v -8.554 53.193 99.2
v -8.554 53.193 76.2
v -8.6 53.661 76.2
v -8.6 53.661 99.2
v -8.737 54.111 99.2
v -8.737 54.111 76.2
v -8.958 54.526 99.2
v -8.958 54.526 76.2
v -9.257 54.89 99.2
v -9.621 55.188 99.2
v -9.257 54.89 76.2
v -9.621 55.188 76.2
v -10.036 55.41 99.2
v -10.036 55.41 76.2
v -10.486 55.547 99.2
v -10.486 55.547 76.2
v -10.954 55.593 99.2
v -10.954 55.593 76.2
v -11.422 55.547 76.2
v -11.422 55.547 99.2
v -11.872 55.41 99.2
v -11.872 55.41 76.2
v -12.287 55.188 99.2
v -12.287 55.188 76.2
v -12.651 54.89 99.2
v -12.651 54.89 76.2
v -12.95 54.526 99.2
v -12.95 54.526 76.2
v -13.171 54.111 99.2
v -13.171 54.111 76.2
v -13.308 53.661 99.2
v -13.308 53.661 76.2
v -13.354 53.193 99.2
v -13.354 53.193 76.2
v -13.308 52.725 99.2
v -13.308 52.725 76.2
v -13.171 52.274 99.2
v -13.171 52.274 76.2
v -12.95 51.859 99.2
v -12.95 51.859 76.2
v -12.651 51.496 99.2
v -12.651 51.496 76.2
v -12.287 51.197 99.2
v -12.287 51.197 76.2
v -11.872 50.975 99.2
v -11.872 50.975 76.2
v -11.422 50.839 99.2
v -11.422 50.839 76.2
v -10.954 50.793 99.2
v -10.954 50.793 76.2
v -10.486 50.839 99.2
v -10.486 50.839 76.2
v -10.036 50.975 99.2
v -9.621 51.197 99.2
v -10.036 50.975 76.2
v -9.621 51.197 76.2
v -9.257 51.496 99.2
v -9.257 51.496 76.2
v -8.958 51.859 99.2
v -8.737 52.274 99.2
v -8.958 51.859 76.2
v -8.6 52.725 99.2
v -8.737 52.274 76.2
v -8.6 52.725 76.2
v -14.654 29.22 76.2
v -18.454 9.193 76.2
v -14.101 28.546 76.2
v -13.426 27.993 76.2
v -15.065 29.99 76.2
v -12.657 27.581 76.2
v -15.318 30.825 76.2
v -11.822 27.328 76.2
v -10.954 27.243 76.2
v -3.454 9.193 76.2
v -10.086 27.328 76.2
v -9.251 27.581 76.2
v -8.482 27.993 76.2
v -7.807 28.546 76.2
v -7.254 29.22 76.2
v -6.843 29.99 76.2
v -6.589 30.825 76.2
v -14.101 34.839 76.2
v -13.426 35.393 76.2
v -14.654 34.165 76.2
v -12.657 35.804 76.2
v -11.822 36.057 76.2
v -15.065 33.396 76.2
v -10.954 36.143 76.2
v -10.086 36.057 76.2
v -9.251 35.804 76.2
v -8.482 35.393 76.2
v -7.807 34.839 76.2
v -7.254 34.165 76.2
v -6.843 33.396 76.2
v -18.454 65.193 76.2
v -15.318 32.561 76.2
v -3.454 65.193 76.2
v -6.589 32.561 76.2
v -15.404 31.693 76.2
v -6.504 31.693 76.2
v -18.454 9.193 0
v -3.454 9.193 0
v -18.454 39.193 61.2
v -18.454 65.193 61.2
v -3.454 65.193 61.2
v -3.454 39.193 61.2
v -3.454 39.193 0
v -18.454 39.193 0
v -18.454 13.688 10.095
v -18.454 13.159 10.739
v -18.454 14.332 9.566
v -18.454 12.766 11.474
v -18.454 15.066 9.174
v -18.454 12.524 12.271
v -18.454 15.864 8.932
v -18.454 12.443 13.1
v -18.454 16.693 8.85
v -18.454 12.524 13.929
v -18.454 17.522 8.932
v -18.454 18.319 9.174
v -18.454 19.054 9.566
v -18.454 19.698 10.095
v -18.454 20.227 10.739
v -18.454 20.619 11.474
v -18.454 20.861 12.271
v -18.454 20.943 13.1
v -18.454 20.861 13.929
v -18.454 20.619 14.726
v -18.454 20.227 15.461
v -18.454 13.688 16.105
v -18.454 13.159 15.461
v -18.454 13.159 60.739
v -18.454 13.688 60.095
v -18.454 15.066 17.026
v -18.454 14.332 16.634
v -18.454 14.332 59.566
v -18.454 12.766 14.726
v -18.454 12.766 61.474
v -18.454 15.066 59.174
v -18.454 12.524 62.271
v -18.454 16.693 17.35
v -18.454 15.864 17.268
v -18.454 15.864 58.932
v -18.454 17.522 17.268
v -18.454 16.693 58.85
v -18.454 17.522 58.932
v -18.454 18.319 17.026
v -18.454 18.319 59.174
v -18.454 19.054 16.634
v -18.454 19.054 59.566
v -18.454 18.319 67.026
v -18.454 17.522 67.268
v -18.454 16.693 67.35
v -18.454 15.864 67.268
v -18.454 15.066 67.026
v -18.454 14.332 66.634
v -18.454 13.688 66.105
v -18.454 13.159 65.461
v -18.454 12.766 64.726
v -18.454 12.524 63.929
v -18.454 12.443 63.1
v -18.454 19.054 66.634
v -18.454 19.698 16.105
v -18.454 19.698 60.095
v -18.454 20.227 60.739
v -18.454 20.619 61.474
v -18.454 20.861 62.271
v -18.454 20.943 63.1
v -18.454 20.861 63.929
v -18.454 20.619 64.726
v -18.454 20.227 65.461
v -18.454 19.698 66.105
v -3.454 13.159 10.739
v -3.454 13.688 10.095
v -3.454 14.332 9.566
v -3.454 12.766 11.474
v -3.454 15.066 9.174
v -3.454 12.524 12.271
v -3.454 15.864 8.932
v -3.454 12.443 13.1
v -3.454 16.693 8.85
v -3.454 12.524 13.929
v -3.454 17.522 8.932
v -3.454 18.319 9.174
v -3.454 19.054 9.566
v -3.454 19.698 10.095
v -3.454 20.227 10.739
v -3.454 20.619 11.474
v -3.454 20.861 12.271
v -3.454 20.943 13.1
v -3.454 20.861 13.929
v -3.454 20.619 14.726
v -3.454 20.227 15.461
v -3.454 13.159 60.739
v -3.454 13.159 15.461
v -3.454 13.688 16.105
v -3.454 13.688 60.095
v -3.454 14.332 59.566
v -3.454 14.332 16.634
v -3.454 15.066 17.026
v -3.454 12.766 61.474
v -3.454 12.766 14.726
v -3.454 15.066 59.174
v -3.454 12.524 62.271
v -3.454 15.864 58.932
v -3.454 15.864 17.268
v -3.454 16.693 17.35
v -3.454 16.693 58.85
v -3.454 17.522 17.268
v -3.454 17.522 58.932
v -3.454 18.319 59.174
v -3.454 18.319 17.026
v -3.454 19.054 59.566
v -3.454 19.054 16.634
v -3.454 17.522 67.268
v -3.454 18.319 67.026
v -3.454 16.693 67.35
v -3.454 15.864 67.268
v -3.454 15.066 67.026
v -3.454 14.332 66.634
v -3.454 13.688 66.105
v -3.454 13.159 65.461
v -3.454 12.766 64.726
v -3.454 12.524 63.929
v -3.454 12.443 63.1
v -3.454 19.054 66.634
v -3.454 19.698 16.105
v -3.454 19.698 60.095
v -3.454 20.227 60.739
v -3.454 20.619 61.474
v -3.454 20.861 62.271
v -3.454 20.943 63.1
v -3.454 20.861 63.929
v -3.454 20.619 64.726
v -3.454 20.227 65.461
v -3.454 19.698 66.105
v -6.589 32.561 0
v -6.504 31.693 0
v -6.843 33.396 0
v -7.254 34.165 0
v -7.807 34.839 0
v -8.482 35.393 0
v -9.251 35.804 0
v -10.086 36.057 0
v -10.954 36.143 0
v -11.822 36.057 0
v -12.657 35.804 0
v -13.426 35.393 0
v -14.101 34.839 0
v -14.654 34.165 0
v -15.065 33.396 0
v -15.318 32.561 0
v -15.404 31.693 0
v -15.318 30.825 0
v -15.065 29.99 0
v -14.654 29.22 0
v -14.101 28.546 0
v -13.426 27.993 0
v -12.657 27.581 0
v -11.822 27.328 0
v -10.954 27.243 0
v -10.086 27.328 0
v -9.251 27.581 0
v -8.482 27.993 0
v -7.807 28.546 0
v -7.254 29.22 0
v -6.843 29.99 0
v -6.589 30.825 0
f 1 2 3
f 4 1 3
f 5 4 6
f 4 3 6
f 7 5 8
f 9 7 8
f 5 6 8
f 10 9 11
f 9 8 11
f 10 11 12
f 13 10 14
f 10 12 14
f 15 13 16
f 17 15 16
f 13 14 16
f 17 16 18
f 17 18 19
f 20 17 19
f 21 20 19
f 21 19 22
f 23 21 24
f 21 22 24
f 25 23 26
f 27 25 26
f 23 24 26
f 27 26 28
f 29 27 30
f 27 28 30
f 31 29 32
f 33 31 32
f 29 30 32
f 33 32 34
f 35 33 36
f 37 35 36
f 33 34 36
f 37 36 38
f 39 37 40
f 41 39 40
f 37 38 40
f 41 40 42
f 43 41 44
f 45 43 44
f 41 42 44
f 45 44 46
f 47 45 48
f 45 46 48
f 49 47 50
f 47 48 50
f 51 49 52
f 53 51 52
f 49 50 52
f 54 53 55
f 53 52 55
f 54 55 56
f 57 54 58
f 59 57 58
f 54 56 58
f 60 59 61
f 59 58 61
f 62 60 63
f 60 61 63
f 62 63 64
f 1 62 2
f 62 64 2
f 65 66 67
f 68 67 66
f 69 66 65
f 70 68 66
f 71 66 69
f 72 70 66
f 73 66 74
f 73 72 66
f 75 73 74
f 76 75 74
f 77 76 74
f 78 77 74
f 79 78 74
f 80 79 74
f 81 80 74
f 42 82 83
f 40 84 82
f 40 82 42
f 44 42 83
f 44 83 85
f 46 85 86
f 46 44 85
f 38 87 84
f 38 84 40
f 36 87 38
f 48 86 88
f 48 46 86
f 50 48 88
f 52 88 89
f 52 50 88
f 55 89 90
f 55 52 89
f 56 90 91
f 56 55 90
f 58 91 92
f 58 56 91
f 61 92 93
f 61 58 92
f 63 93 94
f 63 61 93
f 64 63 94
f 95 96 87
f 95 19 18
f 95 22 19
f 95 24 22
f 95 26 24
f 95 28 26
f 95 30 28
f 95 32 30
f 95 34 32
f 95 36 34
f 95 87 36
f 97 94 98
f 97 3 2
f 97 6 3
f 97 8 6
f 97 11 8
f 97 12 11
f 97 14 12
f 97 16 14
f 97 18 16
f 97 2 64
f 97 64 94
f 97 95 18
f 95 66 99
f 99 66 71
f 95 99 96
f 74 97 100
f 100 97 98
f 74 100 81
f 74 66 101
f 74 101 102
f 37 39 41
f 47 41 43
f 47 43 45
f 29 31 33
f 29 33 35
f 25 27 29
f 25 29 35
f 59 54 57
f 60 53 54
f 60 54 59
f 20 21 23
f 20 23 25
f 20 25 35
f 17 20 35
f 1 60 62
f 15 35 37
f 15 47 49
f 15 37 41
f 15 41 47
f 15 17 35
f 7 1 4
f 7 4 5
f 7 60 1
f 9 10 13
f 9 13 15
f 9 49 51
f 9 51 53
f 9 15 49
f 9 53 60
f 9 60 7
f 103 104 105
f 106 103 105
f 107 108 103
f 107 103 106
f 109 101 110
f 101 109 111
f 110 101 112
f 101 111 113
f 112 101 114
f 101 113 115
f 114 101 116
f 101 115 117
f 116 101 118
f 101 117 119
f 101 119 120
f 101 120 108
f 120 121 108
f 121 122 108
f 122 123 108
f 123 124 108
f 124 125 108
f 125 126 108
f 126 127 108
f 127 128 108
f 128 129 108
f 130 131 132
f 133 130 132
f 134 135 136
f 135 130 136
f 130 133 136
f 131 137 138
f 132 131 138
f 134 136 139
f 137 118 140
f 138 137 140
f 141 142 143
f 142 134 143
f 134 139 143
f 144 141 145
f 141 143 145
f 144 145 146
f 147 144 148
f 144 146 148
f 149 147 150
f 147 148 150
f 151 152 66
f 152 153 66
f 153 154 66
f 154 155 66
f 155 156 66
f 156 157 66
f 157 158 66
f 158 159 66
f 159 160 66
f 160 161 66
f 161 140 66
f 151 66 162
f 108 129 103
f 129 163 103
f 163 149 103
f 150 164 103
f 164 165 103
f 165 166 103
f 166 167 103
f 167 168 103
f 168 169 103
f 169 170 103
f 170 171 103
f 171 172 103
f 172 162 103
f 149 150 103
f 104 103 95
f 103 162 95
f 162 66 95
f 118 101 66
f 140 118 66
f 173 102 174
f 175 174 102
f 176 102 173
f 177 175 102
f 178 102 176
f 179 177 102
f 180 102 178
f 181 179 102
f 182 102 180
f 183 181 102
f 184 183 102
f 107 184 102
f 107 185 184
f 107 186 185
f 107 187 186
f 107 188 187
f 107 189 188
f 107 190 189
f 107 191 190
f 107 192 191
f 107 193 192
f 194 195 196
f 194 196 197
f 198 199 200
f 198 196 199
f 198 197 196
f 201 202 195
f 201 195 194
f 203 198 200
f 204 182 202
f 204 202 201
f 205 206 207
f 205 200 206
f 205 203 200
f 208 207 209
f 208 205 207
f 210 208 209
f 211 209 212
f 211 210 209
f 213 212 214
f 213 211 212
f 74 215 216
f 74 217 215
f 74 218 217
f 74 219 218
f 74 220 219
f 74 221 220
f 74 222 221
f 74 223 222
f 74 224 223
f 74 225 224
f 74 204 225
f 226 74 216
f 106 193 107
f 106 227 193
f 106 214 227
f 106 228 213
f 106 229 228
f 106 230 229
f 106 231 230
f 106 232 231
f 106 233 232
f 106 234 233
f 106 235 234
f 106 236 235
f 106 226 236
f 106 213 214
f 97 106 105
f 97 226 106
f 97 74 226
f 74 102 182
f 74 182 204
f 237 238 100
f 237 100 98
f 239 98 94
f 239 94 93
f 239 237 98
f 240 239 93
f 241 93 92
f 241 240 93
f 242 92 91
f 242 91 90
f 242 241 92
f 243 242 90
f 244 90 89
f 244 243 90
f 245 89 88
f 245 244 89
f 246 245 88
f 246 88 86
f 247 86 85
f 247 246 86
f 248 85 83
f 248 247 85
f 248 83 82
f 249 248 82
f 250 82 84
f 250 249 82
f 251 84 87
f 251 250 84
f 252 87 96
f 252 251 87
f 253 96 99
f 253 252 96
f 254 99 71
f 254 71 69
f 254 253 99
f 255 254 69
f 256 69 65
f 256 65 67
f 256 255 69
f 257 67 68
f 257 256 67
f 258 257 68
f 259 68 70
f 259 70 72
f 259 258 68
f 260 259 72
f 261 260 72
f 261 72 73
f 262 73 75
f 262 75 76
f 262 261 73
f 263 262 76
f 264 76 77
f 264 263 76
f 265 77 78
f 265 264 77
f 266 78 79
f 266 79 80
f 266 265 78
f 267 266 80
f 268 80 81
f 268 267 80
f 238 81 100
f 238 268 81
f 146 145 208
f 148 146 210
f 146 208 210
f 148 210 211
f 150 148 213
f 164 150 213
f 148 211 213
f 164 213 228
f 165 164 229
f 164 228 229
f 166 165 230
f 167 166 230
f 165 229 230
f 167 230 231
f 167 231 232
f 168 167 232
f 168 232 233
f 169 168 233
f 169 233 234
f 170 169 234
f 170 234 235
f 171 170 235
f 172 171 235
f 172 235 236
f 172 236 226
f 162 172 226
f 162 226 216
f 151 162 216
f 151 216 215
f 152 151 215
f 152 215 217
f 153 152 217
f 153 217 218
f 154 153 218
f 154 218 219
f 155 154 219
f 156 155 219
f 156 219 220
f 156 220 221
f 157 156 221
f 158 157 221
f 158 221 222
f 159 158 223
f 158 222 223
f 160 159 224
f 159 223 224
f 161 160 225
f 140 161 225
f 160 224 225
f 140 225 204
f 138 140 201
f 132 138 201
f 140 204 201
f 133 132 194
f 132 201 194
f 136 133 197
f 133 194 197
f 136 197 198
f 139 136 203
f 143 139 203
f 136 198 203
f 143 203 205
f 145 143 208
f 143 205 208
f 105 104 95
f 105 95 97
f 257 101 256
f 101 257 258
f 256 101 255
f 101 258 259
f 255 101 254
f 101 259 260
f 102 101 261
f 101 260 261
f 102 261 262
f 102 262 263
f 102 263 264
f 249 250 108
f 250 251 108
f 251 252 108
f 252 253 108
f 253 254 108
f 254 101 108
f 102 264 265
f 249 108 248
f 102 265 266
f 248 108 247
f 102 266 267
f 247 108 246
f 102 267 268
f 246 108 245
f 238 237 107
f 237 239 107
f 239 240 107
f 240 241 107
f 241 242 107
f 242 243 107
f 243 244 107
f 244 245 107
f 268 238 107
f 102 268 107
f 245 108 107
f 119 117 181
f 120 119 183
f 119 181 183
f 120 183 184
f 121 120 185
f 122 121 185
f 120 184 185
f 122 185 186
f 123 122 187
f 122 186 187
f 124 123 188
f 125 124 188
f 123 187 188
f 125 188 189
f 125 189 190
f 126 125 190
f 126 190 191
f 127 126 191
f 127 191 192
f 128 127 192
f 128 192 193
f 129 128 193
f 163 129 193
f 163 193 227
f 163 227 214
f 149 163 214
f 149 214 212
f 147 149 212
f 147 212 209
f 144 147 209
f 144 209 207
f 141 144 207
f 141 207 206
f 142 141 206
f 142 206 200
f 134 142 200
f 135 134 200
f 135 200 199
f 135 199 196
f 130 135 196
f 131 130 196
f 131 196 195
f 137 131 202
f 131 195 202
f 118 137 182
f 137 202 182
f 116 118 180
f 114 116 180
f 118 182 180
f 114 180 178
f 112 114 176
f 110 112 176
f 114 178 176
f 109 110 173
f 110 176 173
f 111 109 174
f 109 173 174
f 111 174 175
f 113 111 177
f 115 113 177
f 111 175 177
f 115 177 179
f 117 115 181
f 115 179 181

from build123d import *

# Parameters (mm, degrees)
SKETCH2_W           = 15
SKETCH2_H           = 30
SKETCH2_R           = 4.45
BOSS_EXTRUDE1_DEPTH = 76.2
SKETCH3_R           = 4.25
CUT_EXTRUDE2_DEPTH  = 16
SKETCH5_W           = 15
SKETCH5_H           = 26
BOSS_EXTRUDE3_DEPTH = 15
SKETCH8_R           = 2.4
BOSS_EXTRUDE4_DEPTH = 23


with BuildPart() as part:
    # Sketch2 → Boss-Extrude1 (new body)
    with BuildSketch(Plane.XY):
        with Locations((-10.953990987, 24.19276181)):
            Rectangle(SKETCH2_W, SKETCH2_H)
        with Locations((-10.953990987, 31.69276181)):
            Circle(SKETCH2_R, mode=Mode.SUBTRACT)
    extrude(amount=BOSS_EXTRUDE1_DEPTH)

    # Sketch3 → Cut-Extrude2 (cut, through all)
    with BuildSketch(Plane(origin=(-3.453990987, 0, 0), x_dir=(0, 0, -1), z_dir=(1, 0, 0))):
        with Locations((-63.1, 16.69276181)):
            Circle(SKETCH3_R)
        with Locations((-13.1, 16.69276181)):
            Circle(SKETCH3_R)
    extrude(amount=-CUT_EXTRUDE2_DEPTH, mode=Mode.SUBTRACT)

    # Sketch5 → Boss-Extrude3 (add)
    with BuildSketch(Plane.XY.offset(76.2)):
        with Locations((-10.953990987, 52.19276181)):
            Rectangle(SKETCH5_W, SKETCH5_H)
    extrude(amount=-BOSS_EXTRUDE3_DEPTH)

    # Sketch8 → Boss-Extrude4 (add)
    with BuildSketch(Plane.XY.offset(76.2)):
        with Locations((-10.953990987, 53.19276181)):
            Circle(SKETCH8_R)
    extrude(amount=BOSS_EXTRUDE4_DEPTH)


solid = part.part
